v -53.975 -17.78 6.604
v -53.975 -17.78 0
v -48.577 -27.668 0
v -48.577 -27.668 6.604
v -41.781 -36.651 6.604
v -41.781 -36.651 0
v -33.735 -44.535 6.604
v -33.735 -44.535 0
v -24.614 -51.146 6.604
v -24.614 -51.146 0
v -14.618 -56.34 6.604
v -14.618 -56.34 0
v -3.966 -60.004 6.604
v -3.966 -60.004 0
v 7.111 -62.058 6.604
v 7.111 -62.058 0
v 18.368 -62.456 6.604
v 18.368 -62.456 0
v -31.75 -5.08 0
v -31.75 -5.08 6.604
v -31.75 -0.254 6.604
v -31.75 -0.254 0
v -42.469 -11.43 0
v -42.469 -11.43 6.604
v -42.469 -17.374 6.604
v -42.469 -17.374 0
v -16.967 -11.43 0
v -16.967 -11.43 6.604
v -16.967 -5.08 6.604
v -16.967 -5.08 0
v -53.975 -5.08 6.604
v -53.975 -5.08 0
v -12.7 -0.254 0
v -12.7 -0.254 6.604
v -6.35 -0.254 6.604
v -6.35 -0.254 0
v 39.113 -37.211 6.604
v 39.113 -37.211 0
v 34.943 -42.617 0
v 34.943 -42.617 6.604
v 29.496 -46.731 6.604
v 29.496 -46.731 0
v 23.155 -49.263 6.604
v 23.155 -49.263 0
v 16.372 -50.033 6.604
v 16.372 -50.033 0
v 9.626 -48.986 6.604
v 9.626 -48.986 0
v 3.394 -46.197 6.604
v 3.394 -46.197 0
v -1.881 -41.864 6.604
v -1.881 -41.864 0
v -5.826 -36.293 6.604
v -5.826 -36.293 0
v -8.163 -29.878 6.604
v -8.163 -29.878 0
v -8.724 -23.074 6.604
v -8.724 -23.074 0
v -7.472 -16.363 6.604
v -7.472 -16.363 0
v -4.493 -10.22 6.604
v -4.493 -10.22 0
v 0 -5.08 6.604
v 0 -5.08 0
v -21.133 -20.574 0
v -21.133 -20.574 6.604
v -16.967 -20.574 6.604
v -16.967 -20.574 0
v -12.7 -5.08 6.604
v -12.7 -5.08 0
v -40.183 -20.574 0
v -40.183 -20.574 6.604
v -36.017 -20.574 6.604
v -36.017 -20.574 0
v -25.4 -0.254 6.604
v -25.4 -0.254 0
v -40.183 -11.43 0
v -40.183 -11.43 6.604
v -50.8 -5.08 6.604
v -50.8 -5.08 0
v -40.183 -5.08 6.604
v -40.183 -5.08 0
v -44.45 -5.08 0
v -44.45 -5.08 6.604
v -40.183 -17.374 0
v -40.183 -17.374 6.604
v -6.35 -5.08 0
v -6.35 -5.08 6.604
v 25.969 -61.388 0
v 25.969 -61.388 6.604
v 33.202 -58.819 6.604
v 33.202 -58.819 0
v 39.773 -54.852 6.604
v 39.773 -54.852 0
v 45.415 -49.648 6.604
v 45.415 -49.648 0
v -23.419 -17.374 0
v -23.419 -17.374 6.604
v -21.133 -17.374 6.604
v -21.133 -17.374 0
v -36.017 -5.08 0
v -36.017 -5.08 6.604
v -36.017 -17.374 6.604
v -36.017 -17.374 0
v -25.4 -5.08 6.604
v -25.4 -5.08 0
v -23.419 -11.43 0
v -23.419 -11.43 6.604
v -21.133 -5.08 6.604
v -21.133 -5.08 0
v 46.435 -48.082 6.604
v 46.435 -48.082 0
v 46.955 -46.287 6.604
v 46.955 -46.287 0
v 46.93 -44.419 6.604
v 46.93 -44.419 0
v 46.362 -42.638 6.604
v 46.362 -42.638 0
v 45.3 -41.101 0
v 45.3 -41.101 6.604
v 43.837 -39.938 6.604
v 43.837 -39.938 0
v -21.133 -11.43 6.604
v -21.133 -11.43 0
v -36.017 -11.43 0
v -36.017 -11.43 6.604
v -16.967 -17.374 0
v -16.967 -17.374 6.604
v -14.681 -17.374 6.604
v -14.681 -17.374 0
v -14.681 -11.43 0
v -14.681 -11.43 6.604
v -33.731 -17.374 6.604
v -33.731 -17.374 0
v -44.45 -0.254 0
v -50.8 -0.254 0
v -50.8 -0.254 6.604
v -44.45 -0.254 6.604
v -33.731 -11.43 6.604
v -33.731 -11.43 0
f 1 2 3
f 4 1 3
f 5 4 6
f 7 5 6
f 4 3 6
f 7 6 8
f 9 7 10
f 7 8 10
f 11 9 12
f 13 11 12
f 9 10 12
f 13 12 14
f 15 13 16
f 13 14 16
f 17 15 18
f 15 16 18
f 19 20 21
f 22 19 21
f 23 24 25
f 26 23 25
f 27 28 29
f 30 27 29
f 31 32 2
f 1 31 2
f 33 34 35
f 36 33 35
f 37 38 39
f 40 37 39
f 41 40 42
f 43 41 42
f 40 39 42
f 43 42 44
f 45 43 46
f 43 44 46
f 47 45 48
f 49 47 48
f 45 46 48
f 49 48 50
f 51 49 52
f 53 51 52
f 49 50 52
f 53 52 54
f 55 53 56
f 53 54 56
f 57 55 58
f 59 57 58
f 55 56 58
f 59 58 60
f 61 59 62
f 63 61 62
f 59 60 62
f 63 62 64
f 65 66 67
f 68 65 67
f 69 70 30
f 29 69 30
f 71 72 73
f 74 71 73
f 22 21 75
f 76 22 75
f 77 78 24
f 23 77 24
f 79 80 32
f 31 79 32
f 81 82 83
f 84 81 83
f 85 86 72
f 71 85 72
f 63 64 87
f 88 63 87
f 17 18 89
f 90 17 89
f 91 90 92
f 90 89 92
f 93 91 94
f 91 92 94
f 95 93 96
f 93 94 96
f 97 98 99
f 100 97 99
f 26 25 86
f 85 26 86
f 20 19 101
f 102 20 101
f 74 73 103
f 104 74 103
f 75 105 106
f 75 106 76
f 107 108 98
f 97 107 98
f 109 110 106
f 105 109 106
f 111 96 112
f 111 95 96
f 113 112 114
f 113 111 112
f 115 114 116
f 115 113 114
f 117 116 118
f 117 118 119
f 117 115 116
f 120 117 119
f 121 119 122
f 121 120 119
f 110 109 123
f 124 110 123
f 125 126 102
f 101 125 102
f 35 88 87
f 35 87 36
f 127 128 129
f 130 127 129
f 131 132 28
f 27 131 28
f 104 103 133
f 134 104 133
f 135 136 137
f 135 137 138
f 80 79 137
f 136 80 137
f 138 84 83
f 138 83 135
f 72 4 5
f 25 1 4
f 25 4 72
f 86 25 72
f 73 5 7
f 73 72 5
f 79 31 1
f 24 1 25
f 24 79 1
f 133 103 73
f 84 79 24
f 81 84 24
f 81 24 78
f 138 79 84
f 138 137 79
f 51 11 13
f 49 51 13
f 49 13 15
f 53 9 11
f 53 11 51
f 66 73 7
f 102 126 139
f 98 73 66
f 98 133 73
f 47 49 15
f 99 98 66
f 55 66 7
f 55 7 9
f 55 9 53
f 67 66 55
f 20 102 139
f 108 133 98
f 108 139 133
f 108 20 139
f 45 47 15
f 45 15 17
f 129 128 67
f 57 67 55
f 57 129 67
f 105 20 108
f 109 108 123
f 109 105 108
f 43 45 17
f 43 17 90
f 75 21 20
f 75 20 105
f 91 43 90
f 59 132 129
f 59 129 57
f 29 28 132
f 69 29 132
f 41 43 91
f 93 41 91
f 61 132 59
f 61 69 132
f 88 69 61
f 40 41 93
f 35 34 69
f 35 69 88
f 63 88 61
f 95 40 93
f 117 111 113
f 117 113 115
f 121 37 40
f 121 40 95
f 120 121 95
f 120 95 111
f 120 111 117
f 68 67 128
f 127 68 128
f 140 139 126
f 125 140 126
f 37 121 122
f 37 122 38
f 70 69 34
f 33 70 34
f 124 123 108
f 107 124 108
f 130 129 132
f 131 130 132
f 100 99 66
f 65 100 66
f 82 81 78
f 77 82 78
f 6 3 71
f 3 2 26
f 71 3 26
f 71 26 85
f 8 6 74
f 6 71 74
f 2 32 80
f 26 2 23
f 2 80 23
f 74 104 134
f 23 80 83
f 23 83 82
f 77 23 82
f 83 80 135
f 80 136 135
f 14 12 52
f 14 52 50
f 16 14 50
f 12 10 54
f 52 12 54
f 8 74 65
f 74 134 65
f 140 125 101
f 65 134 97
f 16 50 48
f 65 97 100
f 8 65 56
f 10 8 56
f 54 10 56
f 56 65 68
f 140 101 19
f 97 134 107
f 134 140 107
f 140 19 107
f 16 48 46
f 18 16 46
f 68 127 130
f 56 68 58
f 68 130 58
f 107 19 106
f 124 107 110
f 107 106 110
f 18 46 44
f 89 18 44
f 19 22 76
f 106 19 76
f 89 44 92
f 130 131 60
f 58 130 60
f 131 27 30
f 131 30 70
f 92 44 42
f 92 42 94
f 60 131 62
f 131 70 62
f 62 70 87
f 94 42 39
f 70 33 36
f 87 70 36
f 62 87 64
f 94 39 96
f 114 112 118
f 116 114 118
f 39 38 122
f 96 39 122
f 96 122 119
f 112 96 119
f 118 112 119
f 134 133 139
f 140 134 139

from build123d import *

# Parameters (mm, degrees)
BOSS_EXTRUDE1_DEPTH = 6.604
SKETCH3_W           = 6.35
SKETCH3_H           = 4.826
BOSS_EXTRUDE2_DEPTH = 6.604
CUT_EXTRUDE1_REACH  = 8.604
FILLET1_R           = 6.35


with BuildPart() as part:
    # Sketch1 → Boss-Extrude1 (new body)
    with BuildSketch(Plane.XY):
        with BuildLine():
            Line((-6.35, -5.08), (-53.975, -5.08))
            Line((-53.975, -5.08), (-53.975, -17.78))
            ThreePointArc((-53.975, -17.78), (-24.613831362, -51.146124163), (18.36841389, -62.455547599))
            ThreePointArc((18.36841389, -62.455547599), (36.58027843, -57.005297746), (49.891818948, -43.434))
            Line((49.891818948, -43.434), (39.113266772, -37.211))
            ThreePointArc((39.113266772, -37.211), (0.611966481, -44.206961223), (0, -5.08))
            Line((0, -5.08), (-6.35, -5.08))
        make_face()
    extrude(amount=BOSS_EXTRUDE1_DEPTH)

    # Sketch3 → Boss-Extrude2 (add)
    with BuildSketch(Plane.XY.offset(6.604)):
        with Locations((-47.625, -2.667)):
            Rectangle(SKETCH3_W, SKETCH3_H)
        with Locations((-28.575, -2.667)):
            Rectangle(SKETCH3_W, SKETCH3_H)
        with Locations((-9.525, -2.667)):
            Rectangle(SKETCH3_W, SKETCH3_H)
    extrude(amount=-BOSS_EXTRUDE2_DEPTH)

    # Sketch4 → Cut-Extrude1 (cut, up to next)
    with BuildSketch(Plane.XY.offset(6.604), mode=Mode.PRIVATE) as cut_extrude1_sk1:
        Polygon((-40.1828, -5.08), (-40.1828, -11.43), (-42.4688, -11.43), (-42.4688, -17.3736), (-40.1828, -17.3736), (-40.1828, -20.574), (-36.0172, -20.574), (-36.0172, -17.3736), (-33.7312, -17.3736), (-33.7312, -11.43), (-36.0172, -11.43), (-36.0172, -5.08), align=None)
    cut_extrude1_tool1 = extrude(cut_extrude1_sk1.sketch, amount=-CUT_EXTRUDE1_REACH, mode=Mode.PRIVATE) & part.part
    add(cut_extrude1_tool1.solids().sort_by_distance((-38.1, -13.293591, 6.604))[0], mode=Mode.SUBTRACT)
    # Sketch4 → Cut-Extrude1 (cut, up to next)
    with BuildSketch(Plane.XY.offset(6.604), mode=Mode.PRIVATE) as cut_extrude1_sk2:
        Polygon((-21.1328, -11.43), (-23.4188, -11.43), (-23.4188, -17.3736), (-21.1328, -17.3736), (-21.1328, -20.574), (-16.9672, -20.574), (-16.9672, -17.3736), (-14.6812, -17.3736), (-14.6812, -11.43), (-16.9672, -11.43), (-16.9672, -5.08), (-21.1328, -5.08), align=None)
    cut_extrude1_tool2 = extrude(cut_extrude1_sk2.sketch, amount=-CUT_EXTRUDE1_REACH, mode=Mode.PRIVATE) & part.part
    add(cut_extrude1_tool2.solids().sort_by_distance((-19.05, -13.293591, 6.604))[0], mode=Mode.SUBTRACT)

    # Fillet1
    fillet1_edges = [part.edges().sort_by_distance(p)[0] for p in [
        (49.891818948, -43.434, 3.302),
    ]]
    fillet(fillet1_edges, radius=FILLET1_R)


solid = part.part
